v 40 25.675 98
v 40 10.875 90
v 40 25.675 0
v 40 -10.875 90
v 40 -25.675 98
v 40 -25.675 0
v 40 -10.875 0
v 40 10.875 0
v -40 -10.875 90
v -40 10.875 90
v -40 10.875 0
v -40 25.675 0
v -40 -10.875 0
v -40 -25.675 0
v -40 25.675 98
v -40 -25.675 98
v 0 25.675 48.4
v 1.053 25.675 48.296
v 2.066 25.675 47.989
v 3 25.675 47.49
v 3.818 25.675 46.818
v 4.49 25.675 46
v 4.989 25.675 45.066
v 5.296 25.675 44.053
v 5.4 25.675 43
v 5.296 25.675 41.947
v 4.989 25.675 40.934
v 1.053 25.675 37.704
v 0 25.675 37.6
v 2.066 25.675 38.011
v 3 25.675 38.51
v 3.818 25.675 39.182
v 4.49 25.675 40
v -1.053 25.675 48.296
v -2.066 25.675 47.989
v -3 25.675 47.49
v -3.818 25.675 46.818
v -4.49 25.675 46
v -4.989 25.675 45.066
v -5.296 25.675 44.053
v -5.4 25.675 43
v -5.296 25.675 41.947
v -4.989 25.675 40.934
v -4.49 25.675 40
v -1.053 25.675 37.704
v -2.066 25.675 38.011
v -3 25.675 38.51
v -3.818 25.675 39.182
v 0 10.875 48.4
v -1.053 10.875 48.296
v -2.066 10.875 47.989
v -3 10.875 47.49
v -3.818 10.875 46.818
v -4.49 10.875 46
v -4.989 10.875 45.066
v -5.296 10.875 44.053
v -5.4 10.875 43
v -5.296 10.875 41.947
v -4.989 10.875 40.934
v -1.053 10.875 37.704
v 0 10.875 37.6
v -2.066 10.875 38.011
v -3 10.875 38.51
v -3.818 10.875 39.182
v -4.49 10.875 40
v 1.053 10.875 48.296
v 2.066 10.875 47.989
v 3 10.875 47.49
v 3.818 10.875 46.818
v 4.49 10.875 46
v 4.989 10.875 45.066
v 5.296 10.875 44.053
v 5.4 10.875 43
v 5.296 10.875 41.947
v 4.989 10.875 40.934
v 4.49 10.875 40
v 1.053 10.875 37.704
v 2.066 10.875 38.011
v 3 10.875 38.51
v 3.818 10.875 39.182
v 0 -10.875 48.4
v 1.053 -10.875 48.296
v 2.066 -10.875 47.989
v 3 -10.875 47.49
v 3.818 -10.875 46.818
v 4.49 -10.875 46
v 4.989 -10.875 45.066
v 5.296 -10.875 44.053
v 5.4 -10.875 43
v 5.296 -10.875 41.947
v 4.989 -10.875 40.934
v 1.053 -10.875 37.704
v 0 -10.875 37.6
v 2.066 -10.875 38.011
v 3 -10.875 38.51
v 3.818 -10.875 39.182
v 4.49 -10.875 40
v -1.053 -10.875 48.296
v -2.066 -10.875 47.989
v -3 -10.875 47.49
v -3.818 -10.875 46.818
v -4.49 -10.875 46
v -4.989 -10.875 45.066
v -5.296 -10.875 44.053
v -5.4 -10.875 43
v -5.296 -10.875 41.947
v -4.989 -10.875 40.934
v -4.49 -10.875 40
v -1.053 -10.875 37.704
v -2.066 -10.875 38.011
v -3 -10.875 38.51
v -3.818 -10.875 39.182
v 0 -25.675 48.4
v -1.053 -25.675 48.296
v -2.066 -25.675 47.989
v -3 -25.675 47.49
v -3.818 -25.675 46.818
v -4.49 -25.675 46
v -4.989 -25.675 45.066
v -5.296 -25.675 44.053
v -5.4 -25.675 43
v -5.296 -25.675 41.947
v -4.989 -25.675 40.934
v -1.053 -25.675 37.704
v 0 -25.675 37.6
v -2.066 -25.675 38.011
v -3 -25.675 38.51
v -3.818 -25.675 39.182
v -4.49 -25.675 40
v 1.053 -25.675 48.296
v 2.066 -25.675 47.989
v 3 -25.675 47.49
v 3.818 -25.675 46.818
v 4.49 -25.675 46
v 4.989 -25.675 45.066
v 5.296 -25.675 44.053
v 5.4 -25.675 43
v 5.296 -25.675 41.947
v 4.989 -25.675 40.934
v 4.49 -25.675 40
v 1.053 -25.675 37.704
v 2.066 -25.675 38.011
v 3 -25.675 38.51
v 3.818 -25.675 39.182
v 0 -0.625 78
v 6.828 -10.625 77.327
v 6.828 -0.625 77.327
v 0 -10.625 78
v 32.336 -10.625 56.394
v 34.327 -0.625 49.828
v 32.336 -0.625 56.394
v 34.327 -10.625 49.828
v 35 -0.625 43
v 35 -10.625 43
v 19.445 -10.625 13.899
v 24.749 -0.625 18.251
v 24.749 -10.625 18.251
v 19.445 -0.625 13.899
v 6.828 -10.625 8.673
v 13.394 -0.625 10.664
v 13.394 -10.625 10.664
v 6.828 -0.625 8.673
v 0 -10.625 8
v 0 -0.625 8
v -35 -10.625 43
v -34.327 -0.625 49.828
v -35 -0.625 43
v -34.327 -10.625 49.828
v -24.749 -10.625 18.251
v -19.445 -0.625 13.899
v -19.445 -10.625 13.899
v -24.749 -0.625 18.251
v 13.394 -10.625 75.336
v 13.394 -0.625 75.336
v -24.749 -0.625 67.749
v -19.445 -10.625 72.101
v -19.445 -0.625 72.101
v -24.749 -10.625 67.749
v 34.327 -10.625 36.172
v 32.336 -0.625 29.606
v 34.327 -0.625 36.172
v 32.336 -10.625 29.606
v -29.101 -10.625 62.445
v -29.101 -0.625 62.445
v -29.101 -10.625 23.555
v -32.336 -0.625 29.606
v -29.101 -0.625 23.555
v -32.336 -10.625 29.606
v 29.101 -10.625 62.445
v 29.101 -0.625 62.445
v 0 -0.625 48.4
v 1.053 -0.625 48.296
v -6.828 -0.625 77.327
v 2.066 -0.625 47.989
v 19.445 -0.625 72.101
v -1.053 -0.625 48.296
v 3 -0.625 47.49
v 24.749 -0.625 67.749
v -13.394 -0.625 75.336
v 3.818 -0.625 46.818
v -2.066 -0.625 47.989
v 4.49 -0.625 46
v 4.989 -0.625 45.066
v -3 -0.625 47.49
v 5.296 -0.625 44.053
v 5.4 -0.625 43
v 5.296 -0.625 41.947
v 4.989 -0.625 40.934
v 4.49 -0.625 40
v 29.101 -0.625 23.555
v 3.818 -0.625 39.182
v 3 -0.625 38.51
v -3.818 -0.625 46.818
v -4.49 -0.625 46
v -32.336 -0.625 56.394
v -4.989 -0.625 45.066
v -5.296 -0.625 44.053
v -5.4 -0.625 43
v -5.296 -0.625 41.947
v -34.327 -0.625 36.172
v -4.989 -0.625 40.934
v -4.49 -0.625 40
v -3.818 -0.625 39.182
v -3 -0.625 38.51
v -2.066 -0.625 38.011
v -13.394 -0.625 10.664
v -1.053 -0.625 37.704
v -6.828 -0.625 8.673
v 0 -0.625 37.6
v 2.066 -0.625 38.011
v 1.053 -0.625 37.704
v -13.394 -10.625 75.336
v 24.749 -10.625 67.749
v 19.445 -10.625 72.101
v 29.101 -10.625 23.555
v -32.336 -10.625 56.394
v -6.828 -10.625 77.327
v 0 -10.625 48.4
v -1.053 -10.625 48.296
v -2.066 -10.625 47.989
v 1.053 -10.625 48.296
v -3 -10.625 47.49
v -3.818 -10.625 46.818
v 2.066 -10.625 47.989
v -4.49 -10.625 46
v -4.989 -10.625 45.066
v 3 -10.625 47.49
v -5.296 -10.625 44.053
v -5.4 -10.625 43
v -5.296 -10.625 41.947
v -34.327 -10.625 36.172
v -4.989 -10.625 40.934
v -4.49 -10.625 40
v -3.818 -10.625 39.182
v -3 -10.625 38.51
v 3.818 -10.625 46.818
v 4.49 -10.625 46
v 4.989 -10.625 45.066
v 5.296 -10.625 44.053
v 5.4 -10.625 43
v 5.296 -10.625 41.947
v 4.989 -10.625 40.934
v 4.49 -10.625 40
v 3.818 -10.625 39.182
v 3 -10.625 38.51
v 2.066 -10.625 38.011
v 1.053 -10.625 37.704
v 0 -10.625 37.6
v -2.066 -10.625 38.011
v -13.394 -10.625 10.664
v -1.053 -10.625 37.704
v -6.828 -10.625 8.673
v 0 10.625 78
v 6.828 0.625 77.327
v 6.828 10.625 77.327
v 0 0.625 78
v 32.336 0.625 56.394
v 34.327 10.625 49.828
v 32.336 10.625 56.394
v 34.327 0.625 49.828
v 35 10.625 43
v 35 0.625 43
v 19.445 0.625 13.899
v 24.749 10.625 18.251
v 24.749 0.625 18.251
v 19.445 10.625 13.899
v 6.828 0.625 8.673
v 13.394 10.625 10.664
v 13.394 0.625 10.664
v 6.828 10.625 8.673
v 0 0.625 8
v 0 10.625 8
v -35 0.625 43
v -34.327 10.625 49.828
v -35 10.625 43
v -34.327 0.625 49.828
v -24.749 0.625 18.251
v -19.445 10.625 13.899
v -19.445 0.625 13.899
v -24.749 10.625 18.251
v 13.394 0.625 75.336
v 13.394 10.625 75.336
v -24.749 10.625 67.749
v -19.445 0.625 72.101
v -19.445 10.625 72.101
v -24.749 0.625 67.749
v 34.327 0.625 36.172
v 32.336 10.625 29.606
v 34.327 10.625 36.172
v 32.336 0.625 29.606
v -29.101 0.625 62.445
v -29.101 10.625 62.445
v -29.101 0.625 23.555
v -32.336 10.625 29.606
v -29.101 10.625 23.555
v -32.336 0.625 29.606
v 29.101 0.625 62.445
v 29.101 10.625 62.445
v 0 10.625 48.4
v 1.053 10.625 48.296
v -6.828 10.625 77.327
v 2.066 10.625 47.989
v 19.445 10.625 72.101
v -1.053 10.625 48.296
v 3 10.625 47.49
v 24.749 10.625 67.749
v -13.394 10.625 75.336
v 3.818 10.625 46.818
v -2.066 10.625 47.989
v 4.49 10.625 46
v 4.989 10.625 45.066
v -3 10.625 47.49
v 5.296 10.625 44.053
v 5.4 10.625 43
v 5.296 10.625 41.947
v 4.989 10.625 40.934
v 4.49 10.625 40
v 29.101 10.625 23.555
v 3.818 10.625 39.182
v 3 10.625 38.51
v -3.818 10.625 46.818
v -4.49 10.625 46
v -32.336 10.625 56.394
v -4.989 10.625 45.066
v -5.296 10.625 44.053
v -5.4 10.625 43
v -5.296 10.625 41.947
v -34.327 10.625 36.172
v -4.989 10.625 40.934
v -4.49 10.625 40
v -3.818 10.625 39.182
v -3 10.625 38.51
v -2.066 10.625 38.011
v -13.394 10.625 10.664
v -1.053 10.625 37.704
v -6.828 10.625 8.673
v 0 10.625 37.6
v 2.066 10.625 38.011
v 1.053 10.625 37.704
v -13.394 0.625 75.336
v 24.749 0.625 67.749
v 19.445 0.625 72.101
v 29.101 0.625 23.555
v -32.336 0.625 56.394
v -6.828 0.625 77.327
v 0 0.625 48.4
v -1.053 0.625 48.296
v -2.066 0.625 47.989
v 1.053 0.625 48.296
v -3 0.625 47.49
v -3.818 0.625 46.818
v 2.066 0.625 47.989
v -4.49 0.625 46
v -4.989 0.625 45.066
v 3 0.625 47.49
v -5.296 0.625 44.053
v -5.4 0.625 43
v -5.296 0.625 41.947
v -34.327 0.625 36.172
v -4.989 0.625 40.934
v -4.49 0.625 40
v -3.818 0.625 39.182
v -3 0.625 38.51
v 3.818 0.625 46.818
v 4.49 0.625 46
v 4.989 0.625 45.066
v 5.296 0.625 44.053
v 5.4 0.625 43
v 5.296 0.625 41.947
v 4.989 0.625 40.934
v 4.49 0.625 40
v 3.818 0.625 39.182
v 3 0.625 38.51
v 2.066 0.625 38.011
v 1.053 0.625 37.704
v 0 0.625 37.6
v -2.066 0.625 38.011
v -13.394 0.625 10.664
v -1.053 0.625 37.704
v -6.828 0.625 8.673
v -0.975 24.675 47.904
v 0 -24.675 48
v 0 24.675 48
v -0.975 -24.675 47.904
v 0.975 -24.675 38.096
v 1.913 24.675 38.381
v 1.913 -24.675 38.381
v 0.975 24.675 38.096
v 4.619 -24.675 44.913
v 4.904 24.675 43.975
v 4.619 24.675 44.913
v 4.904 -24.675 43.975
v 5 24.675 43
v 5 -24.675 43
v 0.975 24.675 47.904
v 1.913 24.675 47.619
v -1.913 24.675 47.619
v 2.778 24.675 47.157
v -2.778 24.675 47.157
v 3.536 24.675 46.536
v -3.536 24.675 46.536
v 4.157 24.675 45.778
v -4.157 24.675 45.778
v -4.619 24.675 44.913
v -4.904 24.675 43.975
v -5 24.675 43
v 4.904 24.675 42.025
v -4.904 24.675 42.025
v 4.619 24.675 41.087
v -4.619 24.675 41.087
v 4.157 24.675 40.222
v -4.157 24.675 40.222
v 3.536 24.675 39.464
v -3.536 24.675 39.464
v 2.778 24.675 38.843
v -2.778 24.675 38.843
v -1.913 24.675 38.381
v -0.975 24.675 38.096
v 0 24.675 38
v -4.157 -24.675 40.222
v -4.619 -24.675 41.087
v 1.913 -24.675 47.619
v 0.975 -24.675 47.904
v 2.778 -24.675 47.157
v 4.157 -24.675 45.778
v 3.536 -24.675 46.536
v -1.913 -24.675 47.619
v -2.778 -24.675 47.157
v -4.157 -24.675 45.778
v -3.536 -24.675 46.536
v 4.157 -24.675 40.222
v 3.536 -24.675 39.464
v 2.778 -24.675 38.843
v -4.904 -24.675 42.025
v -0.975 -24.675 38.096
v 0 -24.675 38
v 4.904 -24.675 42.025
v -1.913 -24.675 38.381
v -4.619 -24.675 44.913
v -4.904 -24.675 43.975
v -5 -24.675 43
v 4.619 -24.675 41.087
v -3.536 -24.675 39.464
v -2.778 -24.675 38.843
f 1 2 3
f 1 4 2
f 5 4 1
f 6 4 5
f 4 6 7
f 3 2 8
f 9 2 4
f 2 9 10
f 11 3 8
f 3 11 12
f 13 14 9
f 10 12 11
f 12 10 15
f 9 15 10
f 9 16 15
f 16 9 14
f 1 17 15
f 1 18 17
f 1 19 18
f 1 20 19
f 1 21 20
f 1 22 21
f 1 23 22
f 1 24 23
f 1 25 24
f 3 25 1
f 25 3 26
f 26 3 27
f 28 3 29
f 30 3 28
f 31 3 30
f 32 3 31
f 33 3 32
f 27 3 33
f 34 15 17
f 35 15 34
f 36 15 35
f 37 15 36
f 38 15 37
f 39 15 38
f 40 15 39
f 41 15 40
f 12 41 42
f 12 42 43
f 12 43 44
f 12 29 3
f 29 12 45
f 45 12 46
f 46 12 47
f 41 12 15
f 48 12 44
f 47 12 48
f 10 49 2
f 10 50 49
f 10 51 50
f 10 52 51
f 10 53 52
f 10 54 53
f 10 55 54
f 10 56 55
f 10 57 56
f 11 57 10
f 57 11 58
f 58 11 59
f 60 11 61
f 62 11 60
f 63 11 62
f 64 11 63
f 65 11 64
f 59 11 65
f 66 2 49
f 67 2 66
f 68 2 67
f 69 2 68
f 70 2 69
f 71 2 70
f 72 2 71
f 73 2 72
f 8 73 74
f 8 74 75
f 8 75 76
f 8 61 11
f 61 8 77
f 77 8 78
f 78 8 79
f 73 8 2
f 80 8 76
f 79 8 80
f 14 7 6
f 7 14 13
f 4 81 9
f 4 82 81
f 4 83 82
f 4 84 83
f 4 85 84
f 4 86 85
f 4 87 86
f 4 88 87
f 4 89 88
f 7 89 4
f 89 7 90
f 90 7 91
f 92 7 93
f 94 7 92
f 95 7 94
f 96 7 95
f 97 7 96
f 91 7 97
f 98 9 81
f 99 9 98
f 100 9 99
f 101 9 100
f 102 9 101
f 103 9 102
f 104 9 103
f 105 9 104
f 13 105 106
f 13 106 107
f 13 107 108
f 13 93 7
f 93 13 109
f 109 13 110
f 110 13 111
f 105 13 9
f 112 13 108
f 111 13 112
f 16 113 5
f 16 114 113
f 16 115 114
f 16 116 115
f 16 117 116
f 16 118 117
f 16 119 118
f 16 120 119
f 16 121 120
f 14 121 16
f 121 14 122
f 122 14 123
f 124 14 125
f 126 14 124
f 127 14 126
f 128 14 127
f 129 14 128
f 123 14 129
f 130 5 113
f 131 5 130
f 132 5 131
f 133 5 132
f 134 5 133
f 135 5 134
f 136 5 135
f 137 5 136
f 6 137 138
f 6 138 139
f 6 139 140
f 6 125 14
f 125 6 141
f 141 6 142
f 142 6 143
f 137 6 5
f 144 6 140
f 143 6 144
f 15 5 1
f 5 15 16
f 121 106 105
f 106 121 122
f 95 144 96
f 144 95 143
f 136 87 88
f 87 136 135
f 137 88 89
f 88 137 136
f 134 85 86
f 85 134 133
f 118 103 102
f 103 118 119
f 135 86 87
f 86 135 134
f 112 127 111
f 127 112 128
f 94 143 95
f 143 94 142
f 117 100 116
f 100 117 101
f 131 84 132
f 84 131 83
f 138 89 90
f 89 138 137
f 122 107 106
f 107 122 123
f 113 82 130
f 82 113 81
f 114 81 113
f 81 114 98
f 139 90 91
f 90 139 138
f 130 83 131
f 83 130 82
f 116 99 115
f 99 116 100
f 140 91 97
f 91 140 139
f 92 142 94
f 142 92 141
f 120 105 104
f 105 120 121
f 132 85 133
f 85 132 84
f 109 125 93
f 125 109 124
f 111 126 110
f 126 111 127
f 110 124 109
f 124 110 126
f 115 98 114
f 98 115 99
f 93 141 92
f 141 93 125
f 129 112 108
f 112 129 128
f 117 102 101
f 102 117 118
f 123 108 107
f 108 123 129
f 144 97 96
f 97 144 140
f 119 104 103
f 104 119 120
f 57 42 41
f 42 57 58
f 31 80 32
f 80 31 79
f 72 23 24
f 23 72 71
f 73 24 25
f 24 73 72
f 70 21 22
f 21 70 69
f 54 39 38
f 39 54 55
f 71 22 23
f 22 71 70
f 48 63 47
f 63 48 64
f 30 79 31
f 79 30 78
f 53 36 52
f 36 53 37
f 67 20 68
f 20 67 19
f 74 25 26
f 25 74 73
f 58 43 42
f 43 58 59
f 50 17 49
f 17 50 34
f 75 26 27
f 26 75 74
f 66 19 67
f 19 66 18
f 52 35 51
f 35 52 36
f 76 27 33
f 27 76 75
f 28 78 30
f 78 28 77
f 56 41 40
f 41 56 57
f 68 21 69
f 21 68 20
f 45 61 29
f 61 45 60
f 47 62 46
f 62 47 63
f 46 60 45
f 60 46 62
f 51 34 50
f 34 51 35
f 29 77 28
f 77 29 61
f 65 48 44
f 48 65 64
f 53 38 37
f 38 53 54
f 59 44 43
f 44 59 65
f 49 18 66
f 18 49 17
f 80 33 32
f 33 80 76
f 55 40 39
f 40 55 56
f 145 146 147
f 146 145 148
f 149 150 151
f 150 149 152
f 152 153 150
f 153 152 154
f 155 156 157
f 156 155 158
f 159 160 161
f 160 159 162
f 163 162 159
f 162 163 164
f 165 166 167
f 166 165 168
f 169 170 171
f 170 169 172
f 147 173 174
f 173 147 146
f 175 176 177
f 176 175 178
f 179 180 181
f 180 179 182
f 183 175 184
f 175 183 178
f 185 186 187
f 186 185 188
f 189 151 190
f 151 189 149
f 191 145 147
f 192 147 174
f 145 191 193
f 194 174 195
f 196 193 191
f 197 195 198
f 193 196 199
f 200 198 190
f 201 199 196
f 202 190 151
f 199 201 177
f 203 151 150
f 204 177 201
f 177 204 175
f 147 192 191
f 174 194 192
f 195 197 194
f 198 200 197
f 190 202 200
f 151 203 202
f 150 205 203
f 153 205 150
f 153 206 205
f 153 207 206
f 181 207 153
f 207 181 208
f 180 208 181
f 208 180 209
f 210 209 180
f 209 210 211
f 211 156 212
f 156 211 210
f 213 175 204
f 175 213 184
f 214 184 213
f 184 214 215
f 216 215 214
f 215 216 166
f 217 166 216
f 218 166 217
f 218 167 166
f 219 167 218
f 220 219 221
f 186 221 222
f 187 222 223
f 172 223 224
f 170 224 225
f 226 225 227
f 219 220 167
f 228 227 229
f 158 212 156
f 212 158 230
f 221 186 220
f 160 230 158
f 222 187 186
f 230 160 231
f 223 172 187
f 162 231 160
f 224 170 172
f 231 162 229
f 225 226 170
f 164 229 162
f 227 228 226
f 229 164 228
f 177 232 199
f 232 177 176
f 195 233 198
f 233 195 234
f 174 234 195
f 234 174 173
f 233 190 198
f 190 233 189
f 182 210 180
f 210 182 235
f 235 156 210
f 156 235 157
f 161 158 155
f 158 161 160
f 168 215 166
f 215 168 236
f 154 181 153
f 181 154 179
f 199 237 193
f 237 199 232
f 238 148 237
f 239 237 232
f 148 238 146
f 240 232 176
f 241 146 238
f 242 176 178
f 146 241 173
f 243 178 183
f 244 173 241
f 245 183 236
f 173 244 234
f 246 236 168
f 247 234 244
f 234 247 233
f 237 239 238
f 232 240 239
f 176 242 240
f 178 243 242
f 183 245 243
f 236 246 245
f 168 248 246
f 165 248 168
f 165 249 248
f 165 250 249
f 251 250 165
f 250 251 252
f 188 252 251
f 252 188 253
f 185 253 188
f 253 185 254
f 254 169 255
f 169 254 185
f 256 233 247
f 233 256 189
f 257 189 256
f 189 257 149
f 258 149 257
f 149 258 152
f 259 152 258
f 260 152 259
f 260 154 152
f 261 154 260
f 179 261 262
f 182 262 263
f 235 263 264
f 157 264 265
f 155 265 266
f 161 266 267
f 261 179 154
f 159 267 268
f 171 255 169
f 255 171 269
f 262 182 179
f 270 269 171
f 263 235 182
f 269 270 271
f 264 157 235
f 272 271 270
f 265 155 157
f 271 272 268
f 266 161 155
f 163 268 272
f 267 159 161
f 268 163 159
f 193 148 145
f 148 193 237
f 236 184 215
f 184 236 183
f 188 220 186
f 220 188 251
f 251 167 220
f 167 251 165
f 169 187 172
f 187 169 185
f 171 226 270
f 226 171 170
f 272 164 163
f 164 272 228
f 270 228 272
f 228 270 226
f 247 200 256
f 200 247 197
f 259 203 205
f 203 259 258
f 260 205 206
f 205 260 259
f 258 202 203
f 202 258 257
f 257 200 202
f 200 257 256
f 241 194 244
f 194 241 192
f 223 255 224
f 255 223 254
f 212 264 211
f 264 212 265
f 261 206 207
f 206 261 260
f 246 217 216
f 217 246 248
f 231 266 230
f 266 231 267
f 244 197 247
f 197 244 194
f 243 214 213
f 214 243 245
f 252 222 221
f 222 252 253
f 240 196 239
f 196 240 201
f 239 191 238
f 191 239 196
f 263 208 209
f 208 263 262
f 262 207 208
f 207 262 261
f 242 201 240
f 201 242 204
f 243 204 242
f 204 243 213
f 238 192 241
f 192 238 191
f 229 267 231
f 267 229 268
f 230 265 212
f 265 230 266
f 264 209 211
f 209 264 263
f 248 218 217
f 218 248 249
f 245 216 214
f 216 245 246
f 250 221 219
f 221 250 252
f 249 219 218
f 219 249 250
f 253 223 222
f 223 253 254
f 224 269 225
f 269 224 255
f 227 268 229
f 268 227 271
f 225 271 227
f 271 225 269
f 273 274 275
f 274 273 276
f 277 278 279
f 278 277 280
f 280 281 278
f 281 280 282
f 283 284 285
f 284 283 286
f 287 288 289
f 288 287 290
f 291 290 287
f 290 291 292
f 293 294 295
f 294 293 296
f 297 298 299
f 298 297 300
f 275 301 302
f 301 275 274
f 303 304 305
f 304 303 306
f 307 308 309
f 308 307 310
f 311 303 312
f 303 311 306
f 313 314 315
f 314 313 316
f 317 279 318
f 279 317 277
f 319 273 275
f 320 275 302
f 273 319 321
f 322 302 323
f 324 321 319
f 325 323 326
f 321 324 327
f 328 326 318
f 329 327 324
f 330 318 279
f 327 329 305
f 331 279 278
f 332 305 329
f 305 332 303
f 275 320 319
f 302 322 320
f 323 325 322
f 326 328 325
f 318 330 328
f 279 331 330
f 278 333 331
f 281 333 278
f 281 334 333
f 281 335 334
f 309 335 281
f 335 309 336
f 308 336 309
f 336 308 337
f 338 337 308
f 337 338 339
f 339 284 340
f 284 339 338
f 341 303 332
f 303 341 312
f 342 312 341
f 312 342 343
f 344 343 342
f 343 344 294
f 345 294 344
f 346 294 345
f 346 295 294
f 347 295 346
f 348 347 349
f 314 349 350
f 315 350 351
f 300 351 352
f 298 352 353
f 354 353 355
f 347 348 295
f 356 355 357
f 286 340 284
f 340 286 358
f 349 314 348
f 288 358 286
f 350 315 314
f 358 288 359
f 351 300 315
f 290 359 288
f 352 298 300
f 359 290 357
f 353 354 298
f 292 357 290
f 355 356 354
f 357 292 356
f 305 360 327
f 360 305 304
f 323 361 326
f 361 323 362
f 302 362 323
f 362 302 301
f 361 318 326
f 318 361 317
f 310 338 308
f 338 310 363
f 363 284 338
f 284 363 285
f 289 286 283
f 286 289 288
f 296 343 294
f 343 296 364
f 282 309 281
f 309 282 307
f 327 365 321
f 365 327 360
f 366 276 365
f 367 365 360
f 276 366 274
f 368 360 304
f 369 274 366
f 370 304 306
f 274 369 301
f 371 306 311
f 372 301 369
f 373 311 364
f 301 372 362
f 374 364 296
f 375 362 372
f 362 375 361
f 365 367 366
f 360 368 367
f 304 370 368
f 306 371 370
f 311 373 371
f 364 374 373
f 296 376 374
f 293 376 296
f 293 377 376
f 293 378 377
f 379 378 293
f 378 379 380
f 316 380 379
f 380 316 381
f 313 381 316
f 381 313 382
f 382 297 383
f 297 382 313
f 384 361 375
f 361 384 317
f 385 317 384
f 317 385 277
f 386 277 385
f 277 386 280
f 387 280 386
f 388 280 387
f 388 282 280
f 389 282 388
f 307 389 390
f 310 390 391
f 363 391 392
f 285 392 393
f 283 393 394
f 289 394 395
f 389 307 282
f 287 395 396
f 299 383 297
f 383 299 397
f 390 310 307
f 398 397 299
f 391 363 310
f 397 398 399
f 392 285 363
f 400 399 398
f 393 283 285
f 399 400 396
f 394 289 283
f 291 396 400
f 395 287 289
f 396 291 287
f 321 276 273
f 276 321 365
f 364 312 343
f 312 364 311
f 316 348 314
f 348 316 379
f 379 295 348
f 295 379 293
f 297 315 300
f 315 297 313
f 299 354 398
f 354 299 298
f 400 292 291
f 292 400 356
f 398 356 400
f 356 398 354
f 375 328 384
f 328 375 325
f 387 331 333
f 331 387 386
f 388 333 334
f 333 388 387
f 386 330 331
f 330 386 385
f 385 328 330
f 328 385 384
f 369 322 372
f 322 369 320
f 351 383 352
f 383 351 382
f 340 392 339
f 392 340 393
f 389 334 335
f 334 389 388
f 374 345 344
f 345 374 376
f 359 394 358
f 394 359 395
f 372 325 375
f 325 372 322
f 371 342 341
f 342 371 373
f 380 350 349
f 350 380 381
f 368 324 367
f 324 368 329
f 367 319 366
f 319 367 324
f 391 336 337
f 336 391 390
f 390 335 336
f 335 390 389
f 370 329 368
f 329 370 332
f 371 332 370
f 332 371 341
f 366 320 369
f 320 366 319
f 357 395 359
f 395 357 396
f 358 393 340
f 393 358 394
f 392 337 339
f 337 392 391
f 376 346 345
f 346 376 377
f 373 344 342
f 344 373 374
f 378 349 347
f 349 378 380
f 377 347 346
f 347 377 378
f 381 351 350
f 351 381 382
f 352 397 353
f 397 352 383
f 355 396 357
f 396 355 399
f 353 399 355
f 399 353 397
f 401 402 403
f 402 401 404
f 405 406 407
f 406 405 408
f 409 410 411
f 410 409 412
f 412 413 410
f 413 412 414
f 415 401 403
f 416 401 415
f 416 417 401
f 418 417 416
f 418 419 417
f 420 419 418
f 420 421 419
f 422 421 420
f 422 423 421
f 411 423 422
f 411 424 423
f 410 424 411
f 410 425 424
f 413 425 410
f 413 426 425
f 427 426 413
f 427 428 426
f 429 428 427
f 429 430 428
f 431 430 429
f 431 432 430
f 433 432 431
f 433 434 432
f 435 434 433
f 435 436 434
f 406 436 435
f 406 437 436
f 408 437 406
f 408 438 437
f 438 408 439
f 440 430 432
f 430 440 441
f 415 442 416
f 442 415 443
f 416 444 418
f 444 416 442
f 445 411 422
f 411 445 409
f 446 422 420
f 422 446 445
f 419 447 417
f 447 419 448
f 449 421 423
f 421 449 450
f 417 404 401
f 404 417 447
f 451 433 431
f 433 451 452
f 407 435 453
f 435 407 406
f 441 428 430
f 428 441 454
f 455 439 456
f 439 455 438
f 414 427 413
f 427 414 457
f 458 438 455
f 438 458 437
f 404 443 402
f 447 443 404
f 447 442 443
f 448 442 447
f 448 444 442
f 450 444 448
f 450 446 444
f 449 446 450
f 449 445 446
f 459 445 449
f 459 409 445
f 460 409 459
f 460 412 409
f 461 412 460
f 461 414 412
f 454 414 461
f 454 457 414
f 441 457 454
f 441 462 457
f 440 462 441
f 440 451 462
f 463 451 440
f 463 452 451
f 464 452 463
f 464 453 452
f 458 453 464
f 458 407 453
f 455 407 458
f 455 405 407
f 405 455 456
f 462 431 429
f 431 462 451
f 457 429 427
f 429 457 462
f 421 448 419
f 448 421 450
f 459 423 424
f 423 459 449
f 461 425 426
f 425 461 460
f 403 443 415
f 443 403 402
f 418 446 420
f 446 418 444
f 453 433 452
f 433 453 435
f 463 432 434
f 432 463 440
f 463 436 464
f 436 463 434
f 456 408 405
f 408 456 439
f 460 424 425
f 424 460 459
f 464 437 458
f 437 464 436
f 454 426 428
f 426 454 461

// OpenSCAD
$fn = 32;

// ------------------------------------------------------------------------
// Trolley wheel set: wheels d70, fork 90 mm tall
// Every part is its own module, assembly() places every instance.
// ------------------------------------------------------------------------

// --- part 1 ---
module trolley_fork() {
  difference() {
    union() {
      translate([-40, 10.875, 0]) cube([80, 14.8, 90]);
      translate([-40, -25.675, 0]) cube([80, 14.8, 90]);
      translate([-40, -25.675, 90]) cube([80, 51.35, 8]);
    }
    translate([0, -18.275, 43]) rotate([90, 0, 0]) cylinder(h = 16.8, d = 10.8, center = true);
    translate([0, 18.275, 43]) rotate([90, 0, 0]) cylinder(h = 16.8, d = 10.8, center = true);
  }
}

// --- part 2 ---
module trolley_wheel() {
  difference() {
      translate([0, 0, 0]) cylinder(h = 10, d = 70);
      translate([0, 0, -1]) cylinder(h = 12, d = 10.8);
    }
}

// --- part 3 ---
module trolley_axle() {
  translate([0, 0, -24.675]) cylinder(h = 49.35, d = 10);
}

// --- assembly ---
module assembly() {
  color([0.80, 0.24, 0.20]) translate([0, 0, 0]) rotate([0, 0, 0]) trolley_fork();
  color([0.20, 0.45, 0.75]) translate([0, -0.625, 43]) rotate([90, 0, 0]) trolley_wheel();
  color([0.25, 0.62, 0.32]) translate([0, 10.625, 43]) rotate([90, 0, 0]) trolley_wheel();
  color([0.92, 0.70, 0.18]) translate([0, 0, 43]) rotate([90, 0, 0]) trolley_axle();
}

assembly();
